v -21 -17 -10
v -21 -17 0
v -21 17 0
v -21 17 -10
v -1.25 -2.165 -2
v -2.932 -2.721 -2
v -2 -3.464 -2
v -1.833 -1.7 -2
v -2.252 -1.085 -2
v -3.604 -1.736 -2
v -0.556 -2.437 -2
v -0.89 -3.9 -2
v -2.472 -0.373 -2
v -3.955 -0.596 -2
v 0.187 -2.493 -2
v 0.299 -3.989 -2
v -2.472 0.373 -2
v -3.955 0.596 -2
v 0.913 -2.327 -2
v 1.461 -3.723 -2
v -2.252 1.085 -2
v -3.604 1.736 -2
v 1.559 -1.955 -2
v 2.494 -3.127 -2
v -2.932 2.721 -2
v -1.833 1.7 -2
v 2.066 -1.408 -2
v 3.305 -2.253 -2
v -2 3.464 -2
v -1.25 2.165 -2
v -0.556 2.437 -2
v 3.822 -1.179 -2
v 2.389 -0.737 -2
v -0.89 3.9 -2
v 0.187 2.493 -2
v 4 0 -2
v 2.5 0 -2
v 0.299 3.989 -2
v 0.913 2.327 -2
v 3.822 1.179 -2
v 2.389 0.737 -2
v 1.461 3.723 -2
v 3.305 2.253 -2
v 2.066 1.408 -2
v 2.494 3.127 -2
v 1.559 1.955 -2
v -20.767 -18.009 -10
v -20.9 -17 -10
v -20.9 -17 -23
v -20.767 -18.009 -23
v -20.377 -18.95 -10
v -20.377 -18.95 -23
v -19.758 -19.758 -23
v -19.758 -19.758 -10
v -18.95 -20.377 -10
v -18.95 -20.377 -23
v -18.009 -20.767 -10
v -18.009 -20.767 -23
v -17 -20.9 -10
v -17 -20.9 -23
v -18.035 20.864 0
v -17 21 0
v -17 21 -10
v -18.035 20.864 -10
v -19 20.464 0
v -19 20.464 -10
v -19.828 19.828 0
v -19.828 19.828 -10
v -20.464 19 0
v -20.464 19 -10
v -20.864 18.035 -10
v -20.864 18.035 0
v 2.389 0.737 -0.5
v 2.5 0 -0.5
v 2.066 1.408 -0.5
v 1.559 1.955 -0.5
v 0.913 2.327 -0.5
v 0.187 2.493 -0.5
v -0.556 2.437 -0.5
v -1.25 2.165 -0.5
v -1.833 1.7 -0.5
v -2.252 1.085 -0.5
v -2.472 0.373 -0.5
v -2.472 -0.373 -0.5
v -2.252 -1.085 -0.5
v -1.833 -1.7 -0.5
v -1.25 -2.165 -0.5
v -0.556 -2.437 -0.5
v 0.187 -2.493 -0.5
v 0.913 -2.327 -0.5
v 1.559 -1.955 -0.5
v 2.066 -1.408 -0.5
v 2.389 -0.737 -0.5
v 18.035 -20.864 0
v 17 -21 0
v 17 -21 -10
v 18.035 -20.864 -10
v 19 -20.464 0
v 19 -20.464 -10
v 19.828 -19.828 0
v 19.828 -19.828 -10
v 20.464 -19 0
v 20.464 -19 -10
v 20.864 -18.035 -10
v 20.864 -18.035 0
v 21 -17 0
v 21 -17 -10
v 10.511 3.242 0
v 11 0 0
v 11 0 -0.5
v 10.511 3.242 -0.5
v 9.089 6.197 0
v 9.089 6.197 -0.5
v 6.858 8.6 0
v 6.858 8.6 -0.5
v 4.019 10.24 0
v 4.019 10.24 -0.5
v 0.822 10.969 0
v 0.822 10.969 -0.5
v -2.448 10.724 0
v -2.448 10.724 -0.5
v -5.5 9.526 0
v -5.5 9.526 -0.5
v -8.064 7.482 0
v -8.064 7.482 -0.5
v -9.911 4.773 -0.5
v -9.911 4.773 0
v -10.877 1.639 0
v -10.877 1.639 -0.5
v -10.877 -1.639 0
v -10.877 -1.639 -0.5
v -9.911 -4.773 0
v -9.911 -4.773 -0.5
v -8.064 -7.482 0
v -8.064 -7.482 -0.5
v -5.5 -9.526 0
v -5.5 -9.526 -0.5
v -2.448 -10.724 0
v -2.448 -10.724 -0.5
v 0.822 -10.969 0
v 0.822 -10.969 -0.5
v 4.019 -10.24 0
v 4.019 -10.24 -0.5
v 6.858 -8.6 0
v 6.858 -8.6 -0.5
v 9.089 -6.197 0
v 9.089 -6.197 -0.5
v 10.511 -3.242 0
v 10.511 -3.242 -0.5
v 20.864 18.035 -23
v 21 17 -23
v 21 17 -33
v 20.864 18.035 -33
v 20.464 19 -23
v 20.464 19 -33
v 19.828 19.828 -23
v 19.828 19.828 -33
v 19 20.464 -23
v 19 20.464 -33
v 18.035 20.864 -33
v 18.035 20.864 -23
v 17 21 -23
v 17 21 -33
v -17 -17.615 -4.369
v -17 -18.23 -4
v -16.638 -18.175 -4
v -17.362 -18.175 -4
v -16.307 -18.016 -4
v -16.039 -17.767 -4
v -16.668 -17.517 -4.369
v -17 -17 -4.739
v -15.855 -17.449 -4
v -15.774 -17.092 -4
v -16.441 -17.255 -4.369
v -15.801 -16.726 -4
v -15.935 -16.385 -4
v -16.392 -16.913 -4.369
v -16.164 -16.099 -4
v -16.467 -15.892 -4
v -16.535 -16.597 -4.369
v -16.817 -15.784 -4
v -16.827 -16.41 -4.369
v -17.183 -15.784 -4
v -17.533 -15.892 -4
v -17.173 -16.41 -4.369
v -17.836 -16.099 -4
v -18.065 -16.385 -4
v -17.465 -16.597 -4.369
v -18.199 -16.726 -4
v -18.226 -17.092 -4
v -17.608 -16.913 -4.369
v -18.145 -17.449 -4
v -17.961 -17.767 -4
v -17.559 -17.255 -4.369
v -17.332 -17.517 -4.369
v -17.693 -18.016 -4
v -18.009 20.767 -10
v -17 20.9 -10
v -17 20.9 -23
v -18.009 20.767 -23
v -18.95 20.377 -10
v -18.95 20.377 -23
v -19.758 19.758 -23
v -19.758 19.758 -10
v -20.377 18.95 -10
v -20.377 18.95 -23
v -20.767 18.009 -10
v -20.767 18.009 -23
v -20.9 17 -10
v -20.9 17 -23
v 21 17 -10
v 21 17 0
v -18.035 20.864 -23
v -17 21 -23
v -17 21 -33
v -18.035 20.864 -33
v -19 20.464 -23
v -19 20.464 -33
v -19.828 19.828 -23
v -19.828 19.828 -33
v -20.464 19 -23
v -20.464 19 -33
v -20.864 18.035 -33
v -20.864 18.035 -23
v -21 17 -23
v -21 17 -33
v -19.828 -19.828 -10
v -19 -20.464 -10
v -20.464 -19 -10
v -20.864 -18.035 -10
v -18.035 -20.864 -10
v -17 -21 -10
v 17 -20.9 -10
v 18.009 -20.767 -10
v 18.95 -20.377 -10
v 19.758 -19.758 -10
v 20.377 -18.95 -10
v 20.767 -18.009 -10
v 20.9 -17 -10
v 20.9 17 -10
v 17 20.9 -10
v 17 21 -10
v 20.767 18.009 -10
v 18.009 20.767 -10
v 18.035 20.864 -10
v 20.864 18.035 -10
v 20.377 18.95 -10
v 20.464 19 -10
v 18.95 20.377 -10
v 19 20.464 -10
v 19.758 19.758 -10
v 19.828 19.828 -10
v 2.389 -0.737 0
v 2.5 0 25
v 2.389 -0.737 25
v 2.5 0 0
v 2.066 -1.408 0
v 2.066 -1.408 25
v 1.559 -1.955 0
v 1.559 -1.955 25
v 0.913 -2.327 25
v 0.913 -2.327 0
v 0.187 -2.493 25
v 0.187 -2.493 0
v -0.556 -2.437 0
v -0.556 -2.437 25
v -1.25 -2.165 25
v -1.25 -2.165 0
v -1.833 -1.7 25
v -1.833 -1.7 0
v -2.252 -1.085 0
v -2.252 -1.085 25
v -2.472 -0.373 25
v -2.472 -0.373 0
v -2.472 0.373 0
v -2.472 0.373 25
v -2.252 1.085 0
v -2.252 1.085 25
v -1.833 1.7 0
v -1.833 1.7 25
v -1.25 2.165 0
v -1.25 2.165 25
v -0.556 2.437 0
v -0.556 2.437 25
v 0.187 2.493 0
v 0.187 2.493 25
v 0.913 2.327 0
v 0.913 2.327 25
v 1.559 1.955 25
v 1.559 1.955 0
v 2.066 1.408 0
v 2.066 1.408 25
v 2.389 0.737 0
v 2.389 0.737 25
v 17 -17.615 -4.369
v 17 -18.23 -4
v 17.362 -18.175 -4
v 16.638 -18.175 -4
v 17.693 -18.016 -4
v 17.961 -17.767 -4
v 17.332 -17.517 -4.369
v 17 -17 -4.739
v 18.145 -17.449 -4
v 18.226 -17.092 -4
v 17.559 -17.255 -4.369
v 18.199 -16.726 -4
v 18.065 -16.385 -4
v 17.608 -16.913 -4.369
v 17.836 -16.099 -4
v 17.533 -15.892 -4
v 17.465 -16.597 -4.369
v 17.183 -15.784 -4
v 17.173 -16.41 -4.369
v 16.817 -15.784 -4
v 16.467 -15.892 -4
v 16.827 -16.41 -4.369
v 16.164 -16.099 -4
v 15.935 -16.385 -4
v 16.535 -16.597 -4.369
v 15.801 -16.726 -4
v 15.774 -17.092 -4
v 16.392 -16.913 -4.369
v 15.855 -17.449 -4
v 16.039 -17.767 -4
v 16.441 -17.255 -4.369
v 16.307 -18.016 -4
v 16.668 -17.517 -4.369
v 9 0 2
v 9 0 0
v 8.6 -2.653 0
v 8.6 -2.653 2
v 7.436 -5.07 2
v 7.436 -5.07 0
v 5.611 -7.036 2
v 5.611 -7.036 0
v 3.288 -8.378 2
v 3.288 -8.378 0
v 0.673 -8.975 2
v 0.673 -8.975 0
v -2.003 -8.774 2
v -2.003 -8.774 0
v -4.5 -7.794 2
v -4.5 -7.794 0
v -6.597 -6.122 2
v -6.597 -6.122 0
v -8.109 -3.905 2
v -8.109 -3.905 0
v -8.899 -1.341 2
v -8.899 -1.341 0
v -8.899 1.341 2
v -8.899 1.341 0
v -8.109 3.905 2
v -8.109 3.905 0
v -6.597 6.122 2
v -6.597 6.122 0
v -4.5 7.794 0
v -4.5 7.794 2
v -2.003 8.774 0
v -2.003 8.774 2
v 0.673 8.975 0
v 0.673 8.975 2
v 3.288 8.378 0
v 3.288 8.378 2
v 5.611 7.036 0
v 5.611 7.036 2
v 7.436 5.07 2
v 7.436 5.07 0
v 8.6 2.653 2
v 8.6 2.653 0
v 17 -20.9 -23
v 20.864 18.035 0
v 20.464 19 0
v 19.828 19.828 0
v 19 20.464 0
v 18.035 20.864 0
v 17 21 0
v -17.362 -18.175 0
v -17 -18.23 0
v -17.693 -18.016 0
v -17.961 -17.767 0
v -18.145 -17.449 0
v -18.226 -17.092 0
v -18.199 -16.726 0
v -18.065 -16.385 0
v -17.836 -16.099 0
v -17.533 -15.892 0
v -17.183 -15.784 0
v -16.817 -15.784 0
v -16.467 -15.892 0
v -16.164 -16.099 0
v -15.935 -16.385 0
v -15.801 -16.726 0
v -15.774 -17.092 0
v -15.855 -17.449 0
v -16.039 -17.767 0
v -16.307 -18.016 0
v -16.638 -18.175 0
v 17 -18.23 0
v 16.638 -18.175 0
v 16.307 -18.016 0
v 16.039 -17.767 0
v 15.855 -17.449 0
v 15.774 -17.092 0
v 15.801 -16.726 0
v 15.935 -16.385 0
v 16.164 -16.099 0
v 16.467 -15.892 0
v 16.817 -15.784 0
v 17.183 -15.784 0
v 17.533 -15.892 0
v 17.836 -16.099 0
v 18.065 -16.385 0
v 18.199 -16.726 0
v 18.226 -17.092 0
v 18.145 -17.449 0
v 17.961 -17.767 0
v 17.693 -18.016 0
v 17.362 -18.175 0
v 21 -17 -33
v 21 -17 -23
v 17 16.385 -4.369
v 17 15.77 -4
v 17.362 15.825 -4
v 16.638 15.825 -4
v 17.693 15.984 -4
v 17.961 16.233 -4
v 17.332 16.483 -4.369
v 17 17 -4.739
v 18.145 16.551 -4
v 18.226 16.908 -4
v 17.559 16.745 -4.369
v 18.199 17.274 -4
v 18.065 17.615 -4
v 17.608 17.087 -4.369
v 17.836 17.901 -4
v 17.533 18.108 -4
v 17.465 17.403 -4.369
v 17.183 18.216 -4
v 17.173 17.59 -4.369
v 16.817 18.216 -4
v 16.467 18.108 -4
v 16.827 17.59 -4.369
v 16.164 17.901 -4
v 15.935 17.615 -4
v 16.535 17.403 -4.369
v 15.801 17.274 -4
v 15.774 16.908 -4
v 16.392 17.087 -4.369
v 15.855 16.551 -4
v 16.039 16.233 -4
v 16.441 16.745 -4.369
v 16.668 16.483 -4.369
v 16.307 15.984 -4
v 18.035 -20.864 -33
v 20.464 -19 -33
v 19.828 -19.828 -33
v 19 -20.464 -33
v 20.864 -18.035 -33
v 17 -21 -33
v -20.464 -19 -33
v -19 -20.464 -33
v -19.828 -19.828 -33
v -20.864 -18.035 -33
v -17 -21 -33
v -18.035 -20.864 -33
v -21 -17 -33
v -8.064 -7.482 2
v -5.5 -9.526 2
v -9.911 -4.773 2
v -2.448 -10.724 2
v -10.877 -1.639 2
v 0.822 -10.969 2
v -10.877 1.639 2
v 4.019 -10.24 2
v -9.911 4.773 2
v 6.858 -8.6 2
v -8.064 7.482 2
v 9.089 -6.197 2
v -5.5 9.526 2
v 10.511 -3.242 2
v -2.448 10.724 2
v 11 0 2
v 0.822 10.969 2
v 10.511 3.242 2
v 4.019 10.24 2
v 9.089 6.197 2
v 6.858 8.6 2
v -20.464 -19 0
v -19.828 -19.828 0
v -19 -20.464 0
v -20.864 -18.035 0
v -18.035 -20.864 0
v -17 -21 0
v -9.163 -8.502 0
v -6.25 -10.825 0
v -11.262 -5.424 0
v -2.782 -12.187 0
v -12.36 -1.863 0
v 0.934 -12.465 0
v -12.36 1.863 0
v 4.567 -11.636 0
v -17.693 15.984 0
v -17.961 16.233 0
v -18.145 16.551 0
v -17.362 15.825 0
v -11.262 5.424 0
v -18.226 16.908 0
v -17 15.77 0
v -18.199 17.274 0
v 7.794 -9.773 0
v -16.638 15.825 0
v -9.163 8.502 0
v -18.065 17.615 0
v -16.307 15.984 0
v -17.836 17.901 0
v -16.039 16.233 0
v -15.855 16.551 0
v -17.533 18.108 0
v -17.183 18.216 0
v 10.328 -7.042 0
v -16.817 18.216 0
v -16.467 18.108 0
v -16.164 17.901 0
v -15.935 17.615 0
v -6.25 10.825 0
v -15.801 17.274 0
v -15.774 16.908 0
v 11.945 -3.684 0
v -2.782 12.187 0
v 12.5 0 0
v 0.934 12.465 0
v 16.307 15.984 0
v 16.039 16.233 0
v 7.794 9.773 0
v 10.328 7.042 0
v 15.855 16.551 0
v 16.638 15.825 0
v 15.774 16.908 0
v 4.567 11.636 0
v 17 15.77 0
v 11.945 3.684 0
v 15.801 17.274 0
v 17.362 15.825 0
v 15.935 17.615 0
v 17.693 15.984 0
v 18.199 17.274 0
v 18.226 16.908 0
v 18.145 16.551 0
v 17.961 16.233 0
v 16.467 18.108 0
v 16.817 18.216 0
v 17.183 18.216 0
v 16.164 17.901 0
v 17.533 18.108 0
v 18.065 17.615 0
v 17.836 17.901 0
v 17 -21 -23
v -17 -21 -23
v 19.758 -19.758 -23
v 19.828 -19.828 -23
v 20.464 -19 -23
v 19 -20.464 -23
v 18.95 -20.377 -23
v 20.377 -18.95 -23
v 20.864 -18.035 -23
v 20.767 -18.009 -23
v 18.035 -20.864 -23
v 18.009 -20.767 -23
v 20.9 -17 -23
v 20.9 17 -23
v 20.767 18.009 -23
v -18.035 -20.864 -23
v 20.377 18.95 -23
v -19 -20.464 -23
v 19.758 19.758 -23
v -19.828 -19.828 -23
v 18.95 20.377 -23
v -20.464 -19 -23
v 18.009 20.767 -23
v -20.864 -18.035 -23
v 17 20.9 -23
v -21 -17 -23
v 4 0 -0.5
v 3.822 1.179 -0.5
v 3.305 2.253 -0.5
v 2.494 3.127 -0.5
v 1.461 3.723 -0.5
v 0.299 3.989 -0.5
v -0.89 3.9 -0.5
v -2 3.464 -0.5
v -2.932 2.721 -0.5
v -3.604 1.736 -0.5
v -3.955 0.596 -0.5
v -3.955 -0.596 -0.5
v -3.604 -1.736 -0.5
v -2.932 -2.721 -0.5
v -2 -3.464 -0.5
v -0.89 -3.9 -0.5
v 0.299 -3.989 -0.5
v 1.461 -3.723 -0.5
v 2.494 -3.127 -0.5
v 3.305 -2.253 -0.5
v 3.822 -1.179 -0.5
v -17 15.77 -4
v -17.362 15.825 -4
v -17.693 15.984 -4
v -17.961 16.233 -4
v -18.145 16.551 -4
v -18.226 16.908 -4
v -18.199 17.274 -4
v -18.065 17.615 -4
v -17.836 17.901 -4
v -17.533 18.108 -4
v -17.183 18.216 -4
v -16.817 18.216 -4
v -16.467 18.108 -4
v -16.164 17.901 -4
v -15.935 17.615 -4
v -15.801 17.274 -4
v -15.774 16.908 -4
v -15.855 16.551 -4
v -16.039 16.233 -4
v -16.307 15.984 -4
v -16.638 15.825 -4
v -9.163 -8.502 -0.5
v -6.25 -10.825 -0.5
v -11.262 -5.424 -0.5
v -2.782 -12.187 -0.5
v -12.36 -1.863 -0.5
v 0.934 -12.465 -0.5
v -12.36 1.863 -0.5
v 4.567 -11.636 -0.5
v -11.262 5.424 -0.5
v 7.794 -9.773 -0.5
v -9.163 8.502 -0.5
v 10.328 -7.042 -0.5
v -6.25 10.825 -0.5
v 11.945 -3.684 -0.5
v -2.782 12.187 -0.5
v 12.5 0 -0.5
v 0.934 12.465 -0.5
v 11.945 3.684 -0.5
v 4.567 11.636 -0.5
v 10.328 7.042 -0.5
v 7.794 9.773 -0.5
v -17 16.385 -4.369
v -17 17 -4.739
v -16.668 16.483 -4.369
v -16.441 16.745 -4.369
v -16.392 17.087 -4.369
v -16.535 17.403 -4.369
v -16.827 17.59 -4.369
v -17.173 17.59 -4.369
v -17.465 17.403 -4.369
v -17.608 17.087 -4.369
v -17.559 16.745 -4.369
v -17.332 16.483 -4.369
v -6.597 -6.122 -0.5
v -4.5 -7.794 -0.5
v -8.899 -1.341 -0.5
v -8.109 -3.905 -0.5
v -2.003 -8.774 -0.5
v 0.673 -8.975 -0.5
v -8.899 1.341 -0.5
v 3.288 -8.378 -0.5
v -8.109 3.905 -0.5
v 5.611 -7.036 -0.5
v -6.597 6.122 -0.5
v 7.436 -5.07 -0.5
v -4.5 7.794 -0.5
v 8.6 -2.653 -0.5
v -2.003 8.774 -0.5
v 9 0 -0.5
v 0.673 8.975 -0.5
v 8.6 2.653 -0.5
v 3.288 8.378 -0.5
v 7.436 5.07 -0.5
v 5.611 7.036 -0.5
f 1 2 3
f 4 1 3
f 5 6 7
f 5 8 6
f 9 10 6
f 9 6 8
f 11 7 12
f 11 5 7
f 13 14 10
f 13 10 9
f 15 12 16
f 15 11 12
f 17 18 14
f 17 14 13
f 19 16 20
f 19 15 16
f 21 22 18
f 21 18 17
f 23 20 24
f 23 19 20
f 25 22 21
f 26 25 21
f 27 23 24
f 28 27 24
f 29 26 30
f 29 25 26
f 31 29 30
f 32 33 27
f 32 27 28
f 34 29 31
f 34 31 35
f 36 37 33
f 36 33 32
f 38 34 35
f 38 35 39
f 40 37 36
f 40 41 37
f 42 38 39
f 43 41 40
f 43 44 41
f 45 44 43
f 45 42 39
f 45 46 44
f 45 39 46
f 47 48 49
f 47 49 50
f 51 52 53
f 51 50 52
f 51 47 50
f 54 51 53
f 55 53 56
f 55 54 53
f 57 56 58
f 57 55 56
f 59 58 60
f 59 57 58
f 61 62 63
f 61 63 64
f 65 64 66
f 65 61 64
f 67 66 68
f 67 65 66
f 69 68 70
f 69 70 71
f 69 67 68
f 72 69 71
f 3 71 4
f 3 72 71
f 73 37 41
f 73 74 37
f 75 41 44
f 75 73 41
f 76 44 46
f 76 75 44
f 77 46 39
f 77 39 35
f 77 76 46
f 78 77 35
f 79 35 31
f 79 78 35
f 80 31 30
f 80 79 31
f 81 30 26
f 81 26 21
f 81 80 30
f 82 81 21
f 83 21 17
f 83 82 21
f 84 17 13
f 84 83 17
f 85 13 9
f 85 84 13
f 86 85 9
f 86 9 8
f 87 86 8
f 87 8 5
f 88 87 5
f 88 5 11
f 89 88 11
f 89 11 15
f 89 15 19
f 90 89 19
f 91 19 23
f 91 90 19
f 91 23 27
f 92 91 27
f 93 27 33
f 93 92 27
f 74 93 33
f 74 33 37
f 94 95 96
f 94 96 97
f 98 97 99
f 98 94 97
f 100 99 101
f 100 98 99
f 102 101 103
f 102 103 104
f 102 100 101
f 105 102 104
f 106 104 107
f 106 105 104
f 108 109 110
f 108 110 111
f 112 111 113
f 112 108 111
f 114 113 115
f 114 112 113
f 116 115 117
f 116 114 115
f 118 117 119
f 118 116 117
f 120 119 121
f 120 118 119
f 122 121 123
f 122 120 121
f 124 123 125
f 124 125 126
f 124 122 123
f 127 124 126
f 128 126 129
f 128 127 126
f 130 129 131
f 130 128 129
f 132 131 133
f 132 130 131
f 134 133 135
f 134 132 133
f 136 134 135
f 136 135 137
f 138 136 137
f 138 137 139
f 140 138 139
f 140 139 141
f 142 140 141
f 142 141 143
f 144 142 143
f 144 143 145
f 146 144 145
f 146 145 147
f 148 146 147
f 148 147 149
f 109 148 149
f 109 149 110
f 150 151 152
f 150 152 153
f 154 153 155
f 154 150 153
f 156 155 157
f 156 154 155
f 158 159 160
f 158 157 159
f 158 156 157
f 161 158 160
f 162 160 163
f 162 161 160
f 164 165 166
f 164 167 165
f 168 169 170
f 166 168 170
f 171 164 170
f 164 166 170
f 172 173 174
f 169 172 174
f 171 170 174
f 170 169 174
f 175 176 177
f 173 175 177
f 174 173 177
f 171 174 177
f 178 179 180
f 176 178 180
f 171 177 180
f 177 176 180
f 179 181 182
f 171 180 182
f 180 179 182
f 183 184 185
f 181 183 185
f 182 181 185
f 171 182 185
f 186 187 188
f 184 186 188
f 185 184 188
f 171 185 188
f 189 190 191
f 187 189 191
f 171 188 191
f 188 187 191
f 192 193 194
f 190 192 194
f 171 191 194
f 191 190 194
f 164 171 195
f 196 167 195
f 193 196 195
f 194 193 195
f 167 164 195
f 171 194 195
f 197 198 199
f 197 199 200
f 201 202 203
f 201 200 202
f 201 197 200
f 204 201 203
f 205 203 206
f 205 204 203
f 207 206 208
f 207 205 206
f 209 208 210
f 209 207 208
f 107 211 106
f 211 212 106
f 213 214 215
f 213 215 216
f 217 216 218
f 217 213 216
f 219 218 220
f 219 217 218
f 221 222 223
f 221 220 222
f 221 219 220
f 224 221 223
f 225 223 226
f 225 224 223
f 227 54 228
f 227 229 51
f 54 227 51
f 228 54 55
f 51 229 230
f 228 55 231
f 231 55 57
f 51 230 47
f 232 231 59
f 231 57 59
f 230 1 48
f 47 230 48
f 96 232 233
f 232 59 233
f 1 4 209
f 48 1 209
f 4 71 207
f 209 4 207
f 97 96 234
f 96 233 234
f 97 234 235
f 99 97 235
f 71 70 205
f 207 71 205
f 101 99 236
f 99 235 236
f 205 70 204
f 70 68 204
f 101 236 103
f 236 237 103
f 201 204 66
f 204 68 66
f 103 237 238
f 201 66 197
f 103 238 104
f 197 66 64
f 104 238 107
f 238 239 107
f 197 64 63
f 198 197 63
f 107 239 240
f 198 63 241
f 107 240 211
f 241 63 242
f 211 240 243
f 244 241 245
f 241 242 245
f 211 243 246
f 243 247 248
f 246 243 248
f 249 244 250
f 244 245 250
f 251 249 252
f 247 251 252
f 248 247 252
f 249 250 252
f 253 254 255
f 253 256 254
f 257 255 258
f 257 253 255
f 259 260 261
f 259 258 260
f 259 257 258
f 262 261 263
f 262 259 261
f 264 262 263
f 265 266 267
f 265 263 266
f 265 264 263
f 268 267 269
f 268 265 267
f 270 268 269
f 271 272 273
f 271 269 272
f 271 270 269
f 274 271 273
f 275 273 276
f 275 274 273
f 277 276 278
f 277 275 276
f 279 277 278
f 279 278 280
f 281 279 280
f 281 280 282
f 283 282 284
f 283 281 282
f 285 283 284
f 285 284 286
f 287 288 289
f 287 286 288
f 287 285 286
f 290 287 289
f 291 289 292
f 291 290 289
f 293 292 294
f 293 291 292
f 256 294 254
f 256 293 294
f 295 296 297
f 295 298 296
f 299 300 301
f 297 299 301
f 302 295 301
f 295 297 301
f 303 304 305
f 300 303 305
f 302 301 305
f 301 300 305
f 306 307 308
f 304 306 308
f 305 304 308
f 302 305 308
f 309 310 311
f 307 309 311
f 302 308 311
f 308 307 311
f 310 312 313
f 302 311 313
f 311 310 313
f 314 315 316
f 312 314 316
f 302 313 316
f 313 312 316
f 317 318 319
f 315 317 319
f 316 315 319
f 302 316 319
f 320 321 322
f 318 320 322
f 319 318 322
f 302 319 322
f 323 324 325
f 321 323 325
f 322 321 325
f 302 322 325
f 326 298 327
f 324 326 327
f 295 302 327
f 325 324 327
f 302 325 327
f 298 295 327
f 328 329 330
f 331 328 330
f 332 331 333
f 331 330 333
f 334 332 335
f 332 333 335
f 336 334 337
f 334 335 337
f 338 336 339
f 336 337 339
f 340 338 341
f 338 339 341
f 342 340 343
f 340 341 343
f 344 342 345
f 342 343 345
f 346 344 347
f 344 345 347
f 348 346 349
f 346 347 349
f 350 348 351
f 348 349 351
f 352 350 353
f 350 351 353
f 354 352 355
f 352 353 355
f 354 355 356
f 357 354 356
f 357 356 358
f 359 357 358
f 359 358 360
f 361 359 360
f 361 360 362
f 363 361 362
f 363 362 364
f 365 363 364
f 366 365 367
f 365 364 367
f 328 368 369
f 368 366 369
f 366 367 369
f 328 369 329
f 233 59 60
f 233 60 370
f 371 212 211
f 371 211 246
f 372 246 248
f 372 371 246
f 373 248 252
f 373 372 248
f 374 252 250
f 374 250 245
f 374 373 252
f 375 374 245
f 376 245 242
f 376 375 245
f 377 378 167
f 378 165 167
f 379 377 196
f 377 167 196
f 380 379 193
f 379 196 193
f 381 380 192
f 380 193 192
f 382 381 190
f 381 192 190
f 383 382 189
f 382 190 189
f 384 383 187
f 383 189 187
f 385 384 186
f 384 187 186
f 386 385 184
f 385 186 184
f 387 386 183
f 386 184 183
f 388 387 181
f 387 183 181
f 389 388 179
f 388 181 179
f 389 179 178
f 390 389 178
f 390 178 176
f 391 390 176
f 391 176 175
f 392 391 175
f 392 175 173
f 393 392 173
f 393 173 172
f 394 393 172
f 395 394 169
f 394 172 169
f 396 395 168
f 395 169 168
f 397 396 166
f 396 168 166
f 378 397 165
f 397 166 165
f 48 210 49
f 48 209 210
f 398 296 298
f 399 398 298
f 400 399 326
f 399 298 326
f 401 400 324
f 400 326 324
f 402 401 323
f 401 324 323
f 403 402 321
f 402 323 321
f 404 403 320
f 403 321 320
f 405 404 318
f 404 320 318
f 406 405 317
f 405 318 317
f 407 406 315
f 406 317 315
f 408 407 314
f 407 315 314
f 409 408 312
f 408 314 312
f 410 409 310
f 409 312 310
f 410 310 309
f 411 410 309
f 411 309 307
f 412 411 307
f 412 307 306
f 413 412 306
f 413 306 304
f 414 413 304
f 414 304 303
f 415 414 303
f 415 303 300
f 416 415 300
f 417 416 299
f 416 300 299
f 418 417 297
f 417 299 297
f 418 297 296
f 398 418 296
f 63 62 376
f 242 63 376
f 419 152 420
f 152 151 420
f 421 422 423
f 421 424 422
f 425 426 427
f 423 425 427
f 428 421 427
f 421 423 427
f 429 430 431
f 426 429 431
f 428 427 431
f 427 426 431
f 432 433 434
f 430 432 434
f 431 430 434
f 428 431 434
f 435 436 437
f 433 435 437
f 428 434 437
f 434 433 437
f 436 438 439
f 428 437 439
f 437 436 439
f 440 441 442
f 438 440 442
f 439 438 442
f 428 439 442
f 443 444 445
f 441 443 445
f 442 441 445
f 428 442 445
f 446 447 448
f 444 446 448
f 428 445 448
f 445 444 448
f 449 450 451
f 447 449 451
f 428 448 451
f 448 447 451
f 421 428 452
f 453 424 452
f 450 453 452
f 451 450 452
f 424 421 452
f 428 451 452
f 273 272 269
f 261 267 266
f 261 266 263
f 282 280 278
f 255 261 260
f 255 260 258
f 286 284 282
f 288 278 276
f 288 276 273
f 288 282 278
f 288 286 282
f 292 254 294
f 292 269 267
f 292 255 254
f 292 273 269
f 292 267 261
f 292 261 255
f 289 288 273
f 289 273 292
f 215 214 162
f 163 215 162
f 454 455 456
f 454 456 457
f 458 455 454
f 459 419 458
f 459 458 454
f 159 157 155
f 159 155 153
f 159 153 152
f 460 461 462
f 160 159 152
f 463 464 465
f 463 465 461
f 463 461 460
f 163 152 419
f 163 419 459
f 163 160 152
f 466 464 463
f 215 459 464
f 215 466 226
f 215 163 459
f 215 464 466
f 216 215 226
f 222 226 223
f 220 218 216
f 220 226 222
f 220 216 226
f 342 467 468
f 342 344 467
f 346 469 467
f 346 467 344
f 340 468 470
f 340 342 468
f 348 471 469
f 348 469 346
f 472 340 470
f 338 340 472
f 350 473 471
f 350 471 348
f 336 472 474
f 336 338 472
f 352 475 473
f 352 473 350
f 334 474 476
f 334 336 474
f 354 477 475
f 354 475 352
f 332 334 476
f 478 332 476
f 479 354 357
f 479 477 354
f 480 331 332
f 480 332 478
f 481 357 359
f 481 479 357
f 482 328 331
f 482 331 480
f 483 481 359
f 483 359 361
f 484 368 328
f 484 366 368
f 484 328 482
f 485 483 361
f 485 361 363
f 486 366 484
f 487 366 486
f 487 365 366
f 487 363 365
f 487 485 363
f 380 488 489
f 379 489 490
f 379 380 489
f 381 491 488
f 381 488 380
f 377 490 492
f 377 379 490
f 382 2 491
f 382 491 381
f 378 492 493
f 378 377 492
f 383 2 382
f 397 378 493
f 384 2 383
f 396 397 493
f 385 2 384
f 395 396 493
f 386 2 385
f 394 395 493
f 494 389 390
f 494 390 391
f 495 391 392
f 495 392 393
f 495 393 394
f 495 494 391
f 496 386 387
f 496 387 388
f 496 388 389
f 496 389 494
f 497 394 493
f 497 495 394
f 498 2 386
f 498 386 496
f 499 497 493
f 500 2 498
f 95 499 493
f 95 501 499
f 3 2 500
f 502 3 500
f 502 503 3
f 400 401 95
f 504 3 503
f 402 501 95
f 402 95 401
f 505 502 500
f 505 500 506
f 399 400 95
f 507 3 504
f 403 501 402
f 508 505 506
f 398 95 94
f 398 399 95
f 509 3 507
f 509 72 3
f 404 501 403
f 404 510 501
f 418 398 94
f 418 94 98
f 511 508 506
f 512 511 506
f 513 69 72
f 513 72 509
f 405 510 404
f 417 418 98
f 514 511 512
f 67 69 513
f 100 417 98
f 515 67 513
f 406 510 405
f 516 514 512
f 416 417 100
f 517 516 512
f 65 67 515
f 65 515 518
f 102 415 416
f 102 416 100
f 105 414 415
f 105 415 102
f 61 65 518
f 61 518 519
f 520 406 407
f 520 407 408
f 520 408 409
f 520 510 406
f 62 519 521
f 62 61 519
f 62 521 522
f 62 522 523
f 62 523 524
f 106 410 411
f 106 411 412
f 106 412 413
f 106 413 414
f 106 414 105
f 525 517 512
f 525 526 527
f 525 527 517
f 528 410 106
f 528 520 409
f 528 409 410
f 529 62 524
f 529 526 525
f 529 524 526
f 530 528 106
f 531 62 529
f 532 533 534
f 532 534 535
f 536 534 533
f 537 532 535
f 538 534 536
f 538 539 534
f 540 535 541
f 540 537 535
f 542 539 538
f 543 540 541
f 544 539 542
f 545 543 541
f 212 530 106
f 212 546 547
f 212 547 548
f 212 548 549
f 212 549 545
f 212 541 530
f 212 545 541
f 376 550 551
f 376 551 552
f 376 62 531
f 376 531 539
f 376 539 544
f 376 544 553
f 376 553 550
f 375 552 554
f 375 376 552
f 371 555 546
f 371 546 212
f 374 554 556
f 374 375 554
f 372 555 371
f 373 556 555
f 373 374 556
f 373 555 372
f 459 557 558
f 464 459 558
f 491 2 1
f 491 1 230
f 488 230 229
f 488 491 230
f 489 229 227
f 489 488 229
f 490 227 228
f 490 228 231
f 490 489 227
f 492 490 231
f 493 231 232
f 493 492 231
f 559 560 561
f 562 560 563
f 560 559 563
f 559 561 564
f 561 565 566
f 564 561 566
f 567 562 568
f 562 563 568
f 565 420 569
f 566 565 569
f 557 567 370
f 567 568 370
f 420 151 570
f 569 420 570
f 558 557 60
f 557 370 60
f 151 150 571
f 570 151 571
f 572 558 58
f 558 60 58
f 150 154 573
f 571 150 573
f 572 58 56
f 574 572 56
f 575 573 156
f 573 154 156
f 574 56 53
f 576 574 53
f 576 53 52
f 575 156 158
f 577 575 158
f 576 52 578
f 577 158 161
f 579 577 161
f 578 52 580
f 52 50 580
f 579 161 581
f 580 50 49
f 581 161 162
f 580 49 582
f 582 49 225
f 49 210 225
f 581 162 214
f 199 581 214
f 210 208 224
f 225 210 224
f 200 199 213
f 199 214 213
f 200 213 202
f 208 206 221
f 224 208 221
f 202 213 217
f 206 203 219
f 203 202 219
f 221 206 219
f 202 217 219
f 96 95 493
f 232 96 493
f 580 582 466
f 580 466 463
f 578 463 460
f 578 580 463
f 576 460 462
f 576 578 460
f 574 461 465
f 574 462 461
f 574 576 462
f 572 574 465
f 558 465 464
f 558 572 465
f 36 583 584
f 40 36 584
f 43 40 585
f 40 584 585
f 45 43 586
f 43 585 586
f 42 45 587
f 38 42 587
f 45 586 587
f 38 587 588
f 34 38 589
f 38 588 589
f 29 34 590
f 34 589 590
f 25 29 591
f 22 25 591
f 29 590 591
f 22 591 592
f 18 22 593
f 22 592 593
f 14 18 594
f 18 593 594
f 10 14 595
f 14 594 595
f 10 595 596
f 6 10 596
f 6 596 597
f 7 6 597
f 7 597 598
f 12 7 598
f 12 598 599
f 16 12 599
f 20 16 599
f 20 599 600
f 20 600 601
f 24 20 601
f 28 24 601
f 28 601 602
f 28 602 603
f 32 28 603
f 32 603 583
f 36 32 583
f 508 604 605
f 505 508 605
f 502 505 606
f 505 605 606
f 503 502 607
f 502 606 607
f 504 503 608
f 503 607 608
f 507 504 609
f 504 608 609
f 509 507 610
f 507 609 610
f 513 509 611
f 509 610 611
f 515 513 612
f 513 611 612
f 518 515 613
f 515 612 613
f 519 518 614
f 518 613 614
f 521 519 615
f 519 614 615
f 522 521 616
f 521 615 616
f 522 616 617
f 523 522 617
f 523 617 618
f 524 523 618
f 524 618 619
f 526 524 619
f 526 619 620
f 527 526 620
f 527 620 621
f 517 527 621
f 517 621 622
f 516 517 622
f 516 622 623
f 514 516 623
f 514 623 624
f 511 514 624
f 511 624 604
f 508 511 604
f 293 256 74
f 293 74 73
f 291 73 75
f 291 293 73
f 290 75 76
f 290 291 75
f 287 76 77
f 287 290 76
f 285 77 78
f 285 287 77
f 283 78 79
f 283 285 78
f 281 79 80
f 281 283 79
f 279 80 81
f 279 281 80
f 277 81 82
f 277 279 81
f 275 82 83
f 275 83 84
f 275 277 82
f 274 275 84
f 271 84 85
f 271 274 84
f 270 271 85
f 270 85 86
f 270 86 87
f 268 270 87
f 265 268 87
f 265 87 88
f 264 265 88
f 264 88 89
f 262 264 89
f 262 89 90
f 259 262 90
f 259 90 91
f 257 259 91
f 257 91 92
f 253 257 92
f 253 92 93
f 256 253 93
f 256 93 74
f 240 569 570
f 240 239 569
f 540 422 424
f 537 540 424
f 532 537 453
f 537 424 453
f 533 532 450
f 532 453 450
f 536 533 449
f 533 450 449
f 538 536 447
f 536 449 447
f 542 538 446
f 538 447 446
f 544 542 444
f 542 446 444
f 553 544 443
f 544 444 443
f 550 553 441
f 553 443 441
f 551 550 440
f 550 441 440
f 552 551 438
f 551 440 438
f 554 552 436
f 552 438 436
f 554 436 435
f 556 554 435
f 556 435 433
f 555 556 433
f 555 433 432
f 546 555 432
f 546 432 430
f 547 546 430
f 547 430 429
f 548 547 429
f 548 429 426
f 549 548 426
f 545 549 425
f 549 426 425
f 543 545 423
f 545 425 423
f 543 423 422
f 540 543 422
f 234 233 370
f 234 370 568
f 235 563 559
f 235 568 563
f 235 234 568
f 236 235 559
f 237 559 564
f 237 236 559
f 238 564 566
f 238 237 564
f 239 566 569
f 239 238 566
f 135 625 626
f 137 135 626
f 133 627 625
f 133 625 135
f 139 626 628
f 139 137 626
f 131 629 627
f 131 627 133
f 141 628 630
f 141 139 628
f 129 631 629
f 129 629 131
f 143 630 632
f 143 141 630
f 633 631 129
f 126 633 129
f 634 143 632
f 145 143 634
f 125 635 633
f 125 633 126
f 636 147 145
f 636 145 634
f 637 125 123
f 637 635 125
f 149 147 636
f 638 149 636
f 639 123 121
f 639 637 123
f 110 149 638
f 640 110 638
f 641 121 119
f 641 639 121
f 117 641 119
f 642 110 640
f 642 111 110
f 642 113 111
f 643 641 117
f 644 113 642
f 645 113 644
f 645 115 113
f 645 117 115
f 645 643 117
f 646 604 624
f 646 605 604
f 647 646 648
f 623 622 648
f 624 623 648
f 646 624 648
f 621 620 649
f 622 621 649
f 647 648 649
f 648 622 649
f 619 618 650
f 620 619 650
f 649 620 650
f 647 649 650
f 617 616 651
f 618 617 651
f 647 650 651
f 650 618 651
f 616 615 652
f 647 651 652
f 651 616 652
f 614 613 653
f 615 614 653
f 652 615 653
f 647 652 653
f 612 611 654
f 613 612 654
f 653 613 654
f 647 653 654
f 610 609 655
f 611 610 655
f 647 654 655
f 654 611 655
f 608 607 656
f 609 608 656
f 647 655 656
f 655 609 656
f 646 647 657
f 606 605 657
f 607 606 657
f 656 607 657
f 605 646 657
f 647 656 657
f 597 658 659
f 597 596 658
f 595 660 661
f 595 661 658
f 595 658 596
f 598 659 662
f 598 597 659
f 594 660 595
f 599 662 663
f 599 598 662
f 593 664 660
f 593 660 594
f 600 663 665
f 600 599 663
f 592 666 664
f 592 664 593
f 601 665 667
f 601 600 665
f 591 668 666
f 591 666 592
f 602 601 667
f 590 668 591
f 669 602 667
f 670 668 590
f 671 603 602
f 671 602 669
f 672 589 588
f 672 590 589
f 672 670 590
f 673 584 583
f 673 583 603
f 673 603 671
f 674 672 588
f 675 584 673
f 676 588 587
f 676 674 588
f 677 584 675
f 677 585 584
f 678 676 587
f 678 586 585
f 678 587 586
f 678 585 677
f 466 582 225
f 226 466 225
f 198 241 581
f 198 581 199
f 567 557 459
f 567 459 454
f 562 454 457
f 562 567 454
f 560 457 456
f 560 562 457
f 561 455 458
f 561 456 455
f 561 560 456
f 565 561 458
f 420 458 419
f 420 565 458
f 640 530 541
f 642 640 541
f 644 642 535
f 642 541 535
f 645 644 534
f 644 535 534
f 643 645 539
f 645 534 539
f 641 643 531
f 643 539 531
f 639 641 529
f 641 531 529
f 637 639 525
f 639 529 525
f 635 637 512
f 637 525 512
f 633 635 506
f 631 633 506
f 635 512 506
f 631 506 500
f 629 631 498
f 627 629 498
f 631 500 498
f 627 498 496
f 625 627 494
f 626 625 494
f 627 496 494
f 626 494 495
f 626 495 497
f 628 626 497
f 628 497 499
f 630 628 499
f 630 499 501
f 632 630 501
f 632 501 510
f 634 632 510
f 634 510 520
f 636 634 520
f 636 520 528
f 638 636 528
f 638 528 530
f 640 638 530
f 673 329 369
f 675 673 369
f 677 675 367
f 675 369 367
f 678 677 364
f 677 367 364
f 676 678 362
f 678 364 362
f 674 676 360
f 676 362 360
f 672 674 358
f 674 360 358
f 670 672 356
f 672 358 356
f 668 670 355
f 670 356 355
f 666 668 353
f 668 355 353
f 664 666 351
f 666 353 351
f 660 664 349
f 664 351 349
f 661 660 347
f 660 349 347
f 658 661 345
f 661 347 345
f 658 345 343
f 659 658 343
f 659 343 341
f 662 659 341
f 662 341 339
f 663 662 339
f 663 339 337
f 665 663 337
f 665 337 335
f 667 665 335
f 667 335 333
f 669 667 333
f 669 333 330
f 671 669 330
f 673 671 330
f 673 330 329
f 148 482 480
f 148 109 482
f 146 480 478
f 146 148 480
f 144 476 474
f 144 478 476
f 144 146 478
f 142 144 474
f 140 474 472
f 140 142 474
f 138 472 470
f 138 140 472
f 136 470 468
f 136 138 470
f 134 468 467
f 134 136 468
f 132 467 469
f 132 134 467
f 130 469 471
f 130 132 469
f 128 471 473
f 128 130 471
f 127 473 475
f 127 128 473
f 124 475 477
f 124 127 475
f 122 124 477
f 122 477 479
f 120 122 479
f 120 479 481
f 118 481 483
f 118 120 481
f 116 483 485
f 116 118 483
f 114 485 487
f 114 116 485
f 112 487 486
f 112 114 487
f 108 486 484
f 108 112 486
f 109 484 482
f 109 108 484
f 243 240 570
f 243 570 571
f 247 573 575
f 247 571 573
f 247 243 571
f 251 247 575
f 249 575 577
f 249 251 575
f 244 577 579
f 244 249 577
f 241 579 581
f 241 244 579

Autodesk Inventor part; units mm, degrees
ref_plane "YZ Plane" through (0, 0, 0) normal (1, 0, 0) x (0, 1, 0)
sketch "Sketch1" plane through (0, 0, 0) normal (0, 0, 1) x (1, 0, 0)
  circle A0 centre (0, 0) radius 12.5
  circle A1 centre (0, 0) radius 9
  circle A2 centre (0, 0) radius 11
  line L0 (17, -21) -> (-17, -21)
  line L1 (-21, -17) -> (-21, 17)
  line L2 (-17, 21) -> (17, 21)
  line L3 (21, 17) -> (21, -17)
  line L4 (21, -21) -> (-21, 21) construction
  line L5 (-21, -21) -> (21, 21) construction
  arc A3 (-17, 21) -> (-21, 17) centre (-17, 17) ccw
  arc A4 (-21, -17) -> (-17, -21) centre (-17, -17) ccw
  arc A5 (17, -21) -> (21, -17) centre (17, -17) ccw
  arc A6 (21, 17) -> (17, 21) centre (17, 17) ccw
  line L6 (15.5, -15.5) -> (-15.5, -15.5) construction
  line L7 (-15.5, -15.5) -> (-15.5, 15.5) construction
  line L8 (-15.5, 15.5) -> (15.5, 15.5) construction
  line L9 (15.5, 15.5) -> (15.5, -15.5) construction
  line L10 (15.5, -15.5) -> (-15.5, 15.5) construction
  line L11 (-15.5, -15.5) -> (15.5, 15.5) construction
  circle A7 centre (0, 0) radius 2.5
  circle A8 centre (0, 0) radius 4
  dimension "d0" = 42
  dimension "d2" = 42
  dimension "d3" = 4
  dimension "d4" = 18
  dimension "d5" = 22
  dimension "d6" = 25
  dimension "d7" = 31
  dimension "d22" = 5
  dimension "d23" = 8
ref_plane "Work Plane1" through (0, 0, -10) normal (0, 0, 1) x (1, 0, 0)
ref_plane "Work Plane3" through (0, 0, -23) normal (0, 0, 1) x (1, 0, 0)
ref_plane "Work Plane2" through (0, 0, -33) normal (0, 0, 1) x (1, 0, 0)
extrude "Extrusion1" add sketch "Sketch1" against normal up to surface (10 mm away) from surface at 0 contours A0 | A1 | A2 | L0 A4 L1 A3 L2 A6 L3 A5 | A7 | A8
sketch "Sketch2" plane through (17, 21, -10) normal (0, 0, -1) x (-1, 0, 0)
  arc A0 (34, -42) -> (38, -38) centre (34, -38) ccw projected
  line L0 (38, -38) -> (38, -4) projected
  arc A1 (38, -4) -> (34, 0) centre (34, -4) ccw projected
  line L1 (34, 0) -> (0, 0) projected
  arc A2 (0, 0) -> (-4, -4) centre (0, -4) ccw projected
  line L2 (-4, -4) -> (-4, -38) projected
  arc A3 (-4, -38) -> (0, -42) centre (0, -38) ccw projected
  line L3 (0, -42) -> (34, -42) projected
  line L4 (0, -0.1) -> (34, -0.1)
  arc A4 (37.9, -4) -> (34, -0.1) centre (34, -4) ccw
  line L5 (37.9, -4) -> (37.9, -38)
  arc A5 (34, -41.9) -> (37.9, -38) centre (34, -38) ccw
  line L6 (34, -41.9) -> (0, -41.9)
  arc A6 (-3.9, -38) -> (0, -41.9) centre (0, -38) ccw
  line L7 (-3.9, -38) -> (-3.9, -4)
  arc A7 (0, -0.1) -> (-3.9, -4) centre (0, -4) ccw
  point P0 (17, -21)
  dimension "d13" = 0.1
extrude "Extrusion2" add sketch "Sketch2" along normal up to surface (10 mm away) from surface at 13 contours L3 A3 L2 A2 L1 A1 L0 A0 | L4 A4 L5 A5 L6 A6 L7 A7
extrude "Extrusion3" add sketch "Sketch2" along normal up to surface (13 mm away) from surface at 0 contours L4 A4 L5 A5 L6 A6 L7 A7
extrude "Extrusion4" cut sketch "Sketch1" against normal blind 0.5 contours A0 | A1 | A8
extrude "Extrusion5" add sketch "Sketch1" along normal blind 2 contours A2
extrude "Extrusion6" cut sketch "Sketch1" against normal blind 2 contours A8
extrude "Extrusion7" add sketch "Sketch1" along normal blind 25 contours A7
hole "Hole1" at (-17, 17, 0) at (-17, -17, 0) at (17, -17, 0) at (17, 17, 0) direction (0, 0, -1) diameter 2.459 depth 4 tip angle 118 thread size "M3x0.5" class "6H" standard "ISO Metric profile"
properties part number "nema17 33mm"
